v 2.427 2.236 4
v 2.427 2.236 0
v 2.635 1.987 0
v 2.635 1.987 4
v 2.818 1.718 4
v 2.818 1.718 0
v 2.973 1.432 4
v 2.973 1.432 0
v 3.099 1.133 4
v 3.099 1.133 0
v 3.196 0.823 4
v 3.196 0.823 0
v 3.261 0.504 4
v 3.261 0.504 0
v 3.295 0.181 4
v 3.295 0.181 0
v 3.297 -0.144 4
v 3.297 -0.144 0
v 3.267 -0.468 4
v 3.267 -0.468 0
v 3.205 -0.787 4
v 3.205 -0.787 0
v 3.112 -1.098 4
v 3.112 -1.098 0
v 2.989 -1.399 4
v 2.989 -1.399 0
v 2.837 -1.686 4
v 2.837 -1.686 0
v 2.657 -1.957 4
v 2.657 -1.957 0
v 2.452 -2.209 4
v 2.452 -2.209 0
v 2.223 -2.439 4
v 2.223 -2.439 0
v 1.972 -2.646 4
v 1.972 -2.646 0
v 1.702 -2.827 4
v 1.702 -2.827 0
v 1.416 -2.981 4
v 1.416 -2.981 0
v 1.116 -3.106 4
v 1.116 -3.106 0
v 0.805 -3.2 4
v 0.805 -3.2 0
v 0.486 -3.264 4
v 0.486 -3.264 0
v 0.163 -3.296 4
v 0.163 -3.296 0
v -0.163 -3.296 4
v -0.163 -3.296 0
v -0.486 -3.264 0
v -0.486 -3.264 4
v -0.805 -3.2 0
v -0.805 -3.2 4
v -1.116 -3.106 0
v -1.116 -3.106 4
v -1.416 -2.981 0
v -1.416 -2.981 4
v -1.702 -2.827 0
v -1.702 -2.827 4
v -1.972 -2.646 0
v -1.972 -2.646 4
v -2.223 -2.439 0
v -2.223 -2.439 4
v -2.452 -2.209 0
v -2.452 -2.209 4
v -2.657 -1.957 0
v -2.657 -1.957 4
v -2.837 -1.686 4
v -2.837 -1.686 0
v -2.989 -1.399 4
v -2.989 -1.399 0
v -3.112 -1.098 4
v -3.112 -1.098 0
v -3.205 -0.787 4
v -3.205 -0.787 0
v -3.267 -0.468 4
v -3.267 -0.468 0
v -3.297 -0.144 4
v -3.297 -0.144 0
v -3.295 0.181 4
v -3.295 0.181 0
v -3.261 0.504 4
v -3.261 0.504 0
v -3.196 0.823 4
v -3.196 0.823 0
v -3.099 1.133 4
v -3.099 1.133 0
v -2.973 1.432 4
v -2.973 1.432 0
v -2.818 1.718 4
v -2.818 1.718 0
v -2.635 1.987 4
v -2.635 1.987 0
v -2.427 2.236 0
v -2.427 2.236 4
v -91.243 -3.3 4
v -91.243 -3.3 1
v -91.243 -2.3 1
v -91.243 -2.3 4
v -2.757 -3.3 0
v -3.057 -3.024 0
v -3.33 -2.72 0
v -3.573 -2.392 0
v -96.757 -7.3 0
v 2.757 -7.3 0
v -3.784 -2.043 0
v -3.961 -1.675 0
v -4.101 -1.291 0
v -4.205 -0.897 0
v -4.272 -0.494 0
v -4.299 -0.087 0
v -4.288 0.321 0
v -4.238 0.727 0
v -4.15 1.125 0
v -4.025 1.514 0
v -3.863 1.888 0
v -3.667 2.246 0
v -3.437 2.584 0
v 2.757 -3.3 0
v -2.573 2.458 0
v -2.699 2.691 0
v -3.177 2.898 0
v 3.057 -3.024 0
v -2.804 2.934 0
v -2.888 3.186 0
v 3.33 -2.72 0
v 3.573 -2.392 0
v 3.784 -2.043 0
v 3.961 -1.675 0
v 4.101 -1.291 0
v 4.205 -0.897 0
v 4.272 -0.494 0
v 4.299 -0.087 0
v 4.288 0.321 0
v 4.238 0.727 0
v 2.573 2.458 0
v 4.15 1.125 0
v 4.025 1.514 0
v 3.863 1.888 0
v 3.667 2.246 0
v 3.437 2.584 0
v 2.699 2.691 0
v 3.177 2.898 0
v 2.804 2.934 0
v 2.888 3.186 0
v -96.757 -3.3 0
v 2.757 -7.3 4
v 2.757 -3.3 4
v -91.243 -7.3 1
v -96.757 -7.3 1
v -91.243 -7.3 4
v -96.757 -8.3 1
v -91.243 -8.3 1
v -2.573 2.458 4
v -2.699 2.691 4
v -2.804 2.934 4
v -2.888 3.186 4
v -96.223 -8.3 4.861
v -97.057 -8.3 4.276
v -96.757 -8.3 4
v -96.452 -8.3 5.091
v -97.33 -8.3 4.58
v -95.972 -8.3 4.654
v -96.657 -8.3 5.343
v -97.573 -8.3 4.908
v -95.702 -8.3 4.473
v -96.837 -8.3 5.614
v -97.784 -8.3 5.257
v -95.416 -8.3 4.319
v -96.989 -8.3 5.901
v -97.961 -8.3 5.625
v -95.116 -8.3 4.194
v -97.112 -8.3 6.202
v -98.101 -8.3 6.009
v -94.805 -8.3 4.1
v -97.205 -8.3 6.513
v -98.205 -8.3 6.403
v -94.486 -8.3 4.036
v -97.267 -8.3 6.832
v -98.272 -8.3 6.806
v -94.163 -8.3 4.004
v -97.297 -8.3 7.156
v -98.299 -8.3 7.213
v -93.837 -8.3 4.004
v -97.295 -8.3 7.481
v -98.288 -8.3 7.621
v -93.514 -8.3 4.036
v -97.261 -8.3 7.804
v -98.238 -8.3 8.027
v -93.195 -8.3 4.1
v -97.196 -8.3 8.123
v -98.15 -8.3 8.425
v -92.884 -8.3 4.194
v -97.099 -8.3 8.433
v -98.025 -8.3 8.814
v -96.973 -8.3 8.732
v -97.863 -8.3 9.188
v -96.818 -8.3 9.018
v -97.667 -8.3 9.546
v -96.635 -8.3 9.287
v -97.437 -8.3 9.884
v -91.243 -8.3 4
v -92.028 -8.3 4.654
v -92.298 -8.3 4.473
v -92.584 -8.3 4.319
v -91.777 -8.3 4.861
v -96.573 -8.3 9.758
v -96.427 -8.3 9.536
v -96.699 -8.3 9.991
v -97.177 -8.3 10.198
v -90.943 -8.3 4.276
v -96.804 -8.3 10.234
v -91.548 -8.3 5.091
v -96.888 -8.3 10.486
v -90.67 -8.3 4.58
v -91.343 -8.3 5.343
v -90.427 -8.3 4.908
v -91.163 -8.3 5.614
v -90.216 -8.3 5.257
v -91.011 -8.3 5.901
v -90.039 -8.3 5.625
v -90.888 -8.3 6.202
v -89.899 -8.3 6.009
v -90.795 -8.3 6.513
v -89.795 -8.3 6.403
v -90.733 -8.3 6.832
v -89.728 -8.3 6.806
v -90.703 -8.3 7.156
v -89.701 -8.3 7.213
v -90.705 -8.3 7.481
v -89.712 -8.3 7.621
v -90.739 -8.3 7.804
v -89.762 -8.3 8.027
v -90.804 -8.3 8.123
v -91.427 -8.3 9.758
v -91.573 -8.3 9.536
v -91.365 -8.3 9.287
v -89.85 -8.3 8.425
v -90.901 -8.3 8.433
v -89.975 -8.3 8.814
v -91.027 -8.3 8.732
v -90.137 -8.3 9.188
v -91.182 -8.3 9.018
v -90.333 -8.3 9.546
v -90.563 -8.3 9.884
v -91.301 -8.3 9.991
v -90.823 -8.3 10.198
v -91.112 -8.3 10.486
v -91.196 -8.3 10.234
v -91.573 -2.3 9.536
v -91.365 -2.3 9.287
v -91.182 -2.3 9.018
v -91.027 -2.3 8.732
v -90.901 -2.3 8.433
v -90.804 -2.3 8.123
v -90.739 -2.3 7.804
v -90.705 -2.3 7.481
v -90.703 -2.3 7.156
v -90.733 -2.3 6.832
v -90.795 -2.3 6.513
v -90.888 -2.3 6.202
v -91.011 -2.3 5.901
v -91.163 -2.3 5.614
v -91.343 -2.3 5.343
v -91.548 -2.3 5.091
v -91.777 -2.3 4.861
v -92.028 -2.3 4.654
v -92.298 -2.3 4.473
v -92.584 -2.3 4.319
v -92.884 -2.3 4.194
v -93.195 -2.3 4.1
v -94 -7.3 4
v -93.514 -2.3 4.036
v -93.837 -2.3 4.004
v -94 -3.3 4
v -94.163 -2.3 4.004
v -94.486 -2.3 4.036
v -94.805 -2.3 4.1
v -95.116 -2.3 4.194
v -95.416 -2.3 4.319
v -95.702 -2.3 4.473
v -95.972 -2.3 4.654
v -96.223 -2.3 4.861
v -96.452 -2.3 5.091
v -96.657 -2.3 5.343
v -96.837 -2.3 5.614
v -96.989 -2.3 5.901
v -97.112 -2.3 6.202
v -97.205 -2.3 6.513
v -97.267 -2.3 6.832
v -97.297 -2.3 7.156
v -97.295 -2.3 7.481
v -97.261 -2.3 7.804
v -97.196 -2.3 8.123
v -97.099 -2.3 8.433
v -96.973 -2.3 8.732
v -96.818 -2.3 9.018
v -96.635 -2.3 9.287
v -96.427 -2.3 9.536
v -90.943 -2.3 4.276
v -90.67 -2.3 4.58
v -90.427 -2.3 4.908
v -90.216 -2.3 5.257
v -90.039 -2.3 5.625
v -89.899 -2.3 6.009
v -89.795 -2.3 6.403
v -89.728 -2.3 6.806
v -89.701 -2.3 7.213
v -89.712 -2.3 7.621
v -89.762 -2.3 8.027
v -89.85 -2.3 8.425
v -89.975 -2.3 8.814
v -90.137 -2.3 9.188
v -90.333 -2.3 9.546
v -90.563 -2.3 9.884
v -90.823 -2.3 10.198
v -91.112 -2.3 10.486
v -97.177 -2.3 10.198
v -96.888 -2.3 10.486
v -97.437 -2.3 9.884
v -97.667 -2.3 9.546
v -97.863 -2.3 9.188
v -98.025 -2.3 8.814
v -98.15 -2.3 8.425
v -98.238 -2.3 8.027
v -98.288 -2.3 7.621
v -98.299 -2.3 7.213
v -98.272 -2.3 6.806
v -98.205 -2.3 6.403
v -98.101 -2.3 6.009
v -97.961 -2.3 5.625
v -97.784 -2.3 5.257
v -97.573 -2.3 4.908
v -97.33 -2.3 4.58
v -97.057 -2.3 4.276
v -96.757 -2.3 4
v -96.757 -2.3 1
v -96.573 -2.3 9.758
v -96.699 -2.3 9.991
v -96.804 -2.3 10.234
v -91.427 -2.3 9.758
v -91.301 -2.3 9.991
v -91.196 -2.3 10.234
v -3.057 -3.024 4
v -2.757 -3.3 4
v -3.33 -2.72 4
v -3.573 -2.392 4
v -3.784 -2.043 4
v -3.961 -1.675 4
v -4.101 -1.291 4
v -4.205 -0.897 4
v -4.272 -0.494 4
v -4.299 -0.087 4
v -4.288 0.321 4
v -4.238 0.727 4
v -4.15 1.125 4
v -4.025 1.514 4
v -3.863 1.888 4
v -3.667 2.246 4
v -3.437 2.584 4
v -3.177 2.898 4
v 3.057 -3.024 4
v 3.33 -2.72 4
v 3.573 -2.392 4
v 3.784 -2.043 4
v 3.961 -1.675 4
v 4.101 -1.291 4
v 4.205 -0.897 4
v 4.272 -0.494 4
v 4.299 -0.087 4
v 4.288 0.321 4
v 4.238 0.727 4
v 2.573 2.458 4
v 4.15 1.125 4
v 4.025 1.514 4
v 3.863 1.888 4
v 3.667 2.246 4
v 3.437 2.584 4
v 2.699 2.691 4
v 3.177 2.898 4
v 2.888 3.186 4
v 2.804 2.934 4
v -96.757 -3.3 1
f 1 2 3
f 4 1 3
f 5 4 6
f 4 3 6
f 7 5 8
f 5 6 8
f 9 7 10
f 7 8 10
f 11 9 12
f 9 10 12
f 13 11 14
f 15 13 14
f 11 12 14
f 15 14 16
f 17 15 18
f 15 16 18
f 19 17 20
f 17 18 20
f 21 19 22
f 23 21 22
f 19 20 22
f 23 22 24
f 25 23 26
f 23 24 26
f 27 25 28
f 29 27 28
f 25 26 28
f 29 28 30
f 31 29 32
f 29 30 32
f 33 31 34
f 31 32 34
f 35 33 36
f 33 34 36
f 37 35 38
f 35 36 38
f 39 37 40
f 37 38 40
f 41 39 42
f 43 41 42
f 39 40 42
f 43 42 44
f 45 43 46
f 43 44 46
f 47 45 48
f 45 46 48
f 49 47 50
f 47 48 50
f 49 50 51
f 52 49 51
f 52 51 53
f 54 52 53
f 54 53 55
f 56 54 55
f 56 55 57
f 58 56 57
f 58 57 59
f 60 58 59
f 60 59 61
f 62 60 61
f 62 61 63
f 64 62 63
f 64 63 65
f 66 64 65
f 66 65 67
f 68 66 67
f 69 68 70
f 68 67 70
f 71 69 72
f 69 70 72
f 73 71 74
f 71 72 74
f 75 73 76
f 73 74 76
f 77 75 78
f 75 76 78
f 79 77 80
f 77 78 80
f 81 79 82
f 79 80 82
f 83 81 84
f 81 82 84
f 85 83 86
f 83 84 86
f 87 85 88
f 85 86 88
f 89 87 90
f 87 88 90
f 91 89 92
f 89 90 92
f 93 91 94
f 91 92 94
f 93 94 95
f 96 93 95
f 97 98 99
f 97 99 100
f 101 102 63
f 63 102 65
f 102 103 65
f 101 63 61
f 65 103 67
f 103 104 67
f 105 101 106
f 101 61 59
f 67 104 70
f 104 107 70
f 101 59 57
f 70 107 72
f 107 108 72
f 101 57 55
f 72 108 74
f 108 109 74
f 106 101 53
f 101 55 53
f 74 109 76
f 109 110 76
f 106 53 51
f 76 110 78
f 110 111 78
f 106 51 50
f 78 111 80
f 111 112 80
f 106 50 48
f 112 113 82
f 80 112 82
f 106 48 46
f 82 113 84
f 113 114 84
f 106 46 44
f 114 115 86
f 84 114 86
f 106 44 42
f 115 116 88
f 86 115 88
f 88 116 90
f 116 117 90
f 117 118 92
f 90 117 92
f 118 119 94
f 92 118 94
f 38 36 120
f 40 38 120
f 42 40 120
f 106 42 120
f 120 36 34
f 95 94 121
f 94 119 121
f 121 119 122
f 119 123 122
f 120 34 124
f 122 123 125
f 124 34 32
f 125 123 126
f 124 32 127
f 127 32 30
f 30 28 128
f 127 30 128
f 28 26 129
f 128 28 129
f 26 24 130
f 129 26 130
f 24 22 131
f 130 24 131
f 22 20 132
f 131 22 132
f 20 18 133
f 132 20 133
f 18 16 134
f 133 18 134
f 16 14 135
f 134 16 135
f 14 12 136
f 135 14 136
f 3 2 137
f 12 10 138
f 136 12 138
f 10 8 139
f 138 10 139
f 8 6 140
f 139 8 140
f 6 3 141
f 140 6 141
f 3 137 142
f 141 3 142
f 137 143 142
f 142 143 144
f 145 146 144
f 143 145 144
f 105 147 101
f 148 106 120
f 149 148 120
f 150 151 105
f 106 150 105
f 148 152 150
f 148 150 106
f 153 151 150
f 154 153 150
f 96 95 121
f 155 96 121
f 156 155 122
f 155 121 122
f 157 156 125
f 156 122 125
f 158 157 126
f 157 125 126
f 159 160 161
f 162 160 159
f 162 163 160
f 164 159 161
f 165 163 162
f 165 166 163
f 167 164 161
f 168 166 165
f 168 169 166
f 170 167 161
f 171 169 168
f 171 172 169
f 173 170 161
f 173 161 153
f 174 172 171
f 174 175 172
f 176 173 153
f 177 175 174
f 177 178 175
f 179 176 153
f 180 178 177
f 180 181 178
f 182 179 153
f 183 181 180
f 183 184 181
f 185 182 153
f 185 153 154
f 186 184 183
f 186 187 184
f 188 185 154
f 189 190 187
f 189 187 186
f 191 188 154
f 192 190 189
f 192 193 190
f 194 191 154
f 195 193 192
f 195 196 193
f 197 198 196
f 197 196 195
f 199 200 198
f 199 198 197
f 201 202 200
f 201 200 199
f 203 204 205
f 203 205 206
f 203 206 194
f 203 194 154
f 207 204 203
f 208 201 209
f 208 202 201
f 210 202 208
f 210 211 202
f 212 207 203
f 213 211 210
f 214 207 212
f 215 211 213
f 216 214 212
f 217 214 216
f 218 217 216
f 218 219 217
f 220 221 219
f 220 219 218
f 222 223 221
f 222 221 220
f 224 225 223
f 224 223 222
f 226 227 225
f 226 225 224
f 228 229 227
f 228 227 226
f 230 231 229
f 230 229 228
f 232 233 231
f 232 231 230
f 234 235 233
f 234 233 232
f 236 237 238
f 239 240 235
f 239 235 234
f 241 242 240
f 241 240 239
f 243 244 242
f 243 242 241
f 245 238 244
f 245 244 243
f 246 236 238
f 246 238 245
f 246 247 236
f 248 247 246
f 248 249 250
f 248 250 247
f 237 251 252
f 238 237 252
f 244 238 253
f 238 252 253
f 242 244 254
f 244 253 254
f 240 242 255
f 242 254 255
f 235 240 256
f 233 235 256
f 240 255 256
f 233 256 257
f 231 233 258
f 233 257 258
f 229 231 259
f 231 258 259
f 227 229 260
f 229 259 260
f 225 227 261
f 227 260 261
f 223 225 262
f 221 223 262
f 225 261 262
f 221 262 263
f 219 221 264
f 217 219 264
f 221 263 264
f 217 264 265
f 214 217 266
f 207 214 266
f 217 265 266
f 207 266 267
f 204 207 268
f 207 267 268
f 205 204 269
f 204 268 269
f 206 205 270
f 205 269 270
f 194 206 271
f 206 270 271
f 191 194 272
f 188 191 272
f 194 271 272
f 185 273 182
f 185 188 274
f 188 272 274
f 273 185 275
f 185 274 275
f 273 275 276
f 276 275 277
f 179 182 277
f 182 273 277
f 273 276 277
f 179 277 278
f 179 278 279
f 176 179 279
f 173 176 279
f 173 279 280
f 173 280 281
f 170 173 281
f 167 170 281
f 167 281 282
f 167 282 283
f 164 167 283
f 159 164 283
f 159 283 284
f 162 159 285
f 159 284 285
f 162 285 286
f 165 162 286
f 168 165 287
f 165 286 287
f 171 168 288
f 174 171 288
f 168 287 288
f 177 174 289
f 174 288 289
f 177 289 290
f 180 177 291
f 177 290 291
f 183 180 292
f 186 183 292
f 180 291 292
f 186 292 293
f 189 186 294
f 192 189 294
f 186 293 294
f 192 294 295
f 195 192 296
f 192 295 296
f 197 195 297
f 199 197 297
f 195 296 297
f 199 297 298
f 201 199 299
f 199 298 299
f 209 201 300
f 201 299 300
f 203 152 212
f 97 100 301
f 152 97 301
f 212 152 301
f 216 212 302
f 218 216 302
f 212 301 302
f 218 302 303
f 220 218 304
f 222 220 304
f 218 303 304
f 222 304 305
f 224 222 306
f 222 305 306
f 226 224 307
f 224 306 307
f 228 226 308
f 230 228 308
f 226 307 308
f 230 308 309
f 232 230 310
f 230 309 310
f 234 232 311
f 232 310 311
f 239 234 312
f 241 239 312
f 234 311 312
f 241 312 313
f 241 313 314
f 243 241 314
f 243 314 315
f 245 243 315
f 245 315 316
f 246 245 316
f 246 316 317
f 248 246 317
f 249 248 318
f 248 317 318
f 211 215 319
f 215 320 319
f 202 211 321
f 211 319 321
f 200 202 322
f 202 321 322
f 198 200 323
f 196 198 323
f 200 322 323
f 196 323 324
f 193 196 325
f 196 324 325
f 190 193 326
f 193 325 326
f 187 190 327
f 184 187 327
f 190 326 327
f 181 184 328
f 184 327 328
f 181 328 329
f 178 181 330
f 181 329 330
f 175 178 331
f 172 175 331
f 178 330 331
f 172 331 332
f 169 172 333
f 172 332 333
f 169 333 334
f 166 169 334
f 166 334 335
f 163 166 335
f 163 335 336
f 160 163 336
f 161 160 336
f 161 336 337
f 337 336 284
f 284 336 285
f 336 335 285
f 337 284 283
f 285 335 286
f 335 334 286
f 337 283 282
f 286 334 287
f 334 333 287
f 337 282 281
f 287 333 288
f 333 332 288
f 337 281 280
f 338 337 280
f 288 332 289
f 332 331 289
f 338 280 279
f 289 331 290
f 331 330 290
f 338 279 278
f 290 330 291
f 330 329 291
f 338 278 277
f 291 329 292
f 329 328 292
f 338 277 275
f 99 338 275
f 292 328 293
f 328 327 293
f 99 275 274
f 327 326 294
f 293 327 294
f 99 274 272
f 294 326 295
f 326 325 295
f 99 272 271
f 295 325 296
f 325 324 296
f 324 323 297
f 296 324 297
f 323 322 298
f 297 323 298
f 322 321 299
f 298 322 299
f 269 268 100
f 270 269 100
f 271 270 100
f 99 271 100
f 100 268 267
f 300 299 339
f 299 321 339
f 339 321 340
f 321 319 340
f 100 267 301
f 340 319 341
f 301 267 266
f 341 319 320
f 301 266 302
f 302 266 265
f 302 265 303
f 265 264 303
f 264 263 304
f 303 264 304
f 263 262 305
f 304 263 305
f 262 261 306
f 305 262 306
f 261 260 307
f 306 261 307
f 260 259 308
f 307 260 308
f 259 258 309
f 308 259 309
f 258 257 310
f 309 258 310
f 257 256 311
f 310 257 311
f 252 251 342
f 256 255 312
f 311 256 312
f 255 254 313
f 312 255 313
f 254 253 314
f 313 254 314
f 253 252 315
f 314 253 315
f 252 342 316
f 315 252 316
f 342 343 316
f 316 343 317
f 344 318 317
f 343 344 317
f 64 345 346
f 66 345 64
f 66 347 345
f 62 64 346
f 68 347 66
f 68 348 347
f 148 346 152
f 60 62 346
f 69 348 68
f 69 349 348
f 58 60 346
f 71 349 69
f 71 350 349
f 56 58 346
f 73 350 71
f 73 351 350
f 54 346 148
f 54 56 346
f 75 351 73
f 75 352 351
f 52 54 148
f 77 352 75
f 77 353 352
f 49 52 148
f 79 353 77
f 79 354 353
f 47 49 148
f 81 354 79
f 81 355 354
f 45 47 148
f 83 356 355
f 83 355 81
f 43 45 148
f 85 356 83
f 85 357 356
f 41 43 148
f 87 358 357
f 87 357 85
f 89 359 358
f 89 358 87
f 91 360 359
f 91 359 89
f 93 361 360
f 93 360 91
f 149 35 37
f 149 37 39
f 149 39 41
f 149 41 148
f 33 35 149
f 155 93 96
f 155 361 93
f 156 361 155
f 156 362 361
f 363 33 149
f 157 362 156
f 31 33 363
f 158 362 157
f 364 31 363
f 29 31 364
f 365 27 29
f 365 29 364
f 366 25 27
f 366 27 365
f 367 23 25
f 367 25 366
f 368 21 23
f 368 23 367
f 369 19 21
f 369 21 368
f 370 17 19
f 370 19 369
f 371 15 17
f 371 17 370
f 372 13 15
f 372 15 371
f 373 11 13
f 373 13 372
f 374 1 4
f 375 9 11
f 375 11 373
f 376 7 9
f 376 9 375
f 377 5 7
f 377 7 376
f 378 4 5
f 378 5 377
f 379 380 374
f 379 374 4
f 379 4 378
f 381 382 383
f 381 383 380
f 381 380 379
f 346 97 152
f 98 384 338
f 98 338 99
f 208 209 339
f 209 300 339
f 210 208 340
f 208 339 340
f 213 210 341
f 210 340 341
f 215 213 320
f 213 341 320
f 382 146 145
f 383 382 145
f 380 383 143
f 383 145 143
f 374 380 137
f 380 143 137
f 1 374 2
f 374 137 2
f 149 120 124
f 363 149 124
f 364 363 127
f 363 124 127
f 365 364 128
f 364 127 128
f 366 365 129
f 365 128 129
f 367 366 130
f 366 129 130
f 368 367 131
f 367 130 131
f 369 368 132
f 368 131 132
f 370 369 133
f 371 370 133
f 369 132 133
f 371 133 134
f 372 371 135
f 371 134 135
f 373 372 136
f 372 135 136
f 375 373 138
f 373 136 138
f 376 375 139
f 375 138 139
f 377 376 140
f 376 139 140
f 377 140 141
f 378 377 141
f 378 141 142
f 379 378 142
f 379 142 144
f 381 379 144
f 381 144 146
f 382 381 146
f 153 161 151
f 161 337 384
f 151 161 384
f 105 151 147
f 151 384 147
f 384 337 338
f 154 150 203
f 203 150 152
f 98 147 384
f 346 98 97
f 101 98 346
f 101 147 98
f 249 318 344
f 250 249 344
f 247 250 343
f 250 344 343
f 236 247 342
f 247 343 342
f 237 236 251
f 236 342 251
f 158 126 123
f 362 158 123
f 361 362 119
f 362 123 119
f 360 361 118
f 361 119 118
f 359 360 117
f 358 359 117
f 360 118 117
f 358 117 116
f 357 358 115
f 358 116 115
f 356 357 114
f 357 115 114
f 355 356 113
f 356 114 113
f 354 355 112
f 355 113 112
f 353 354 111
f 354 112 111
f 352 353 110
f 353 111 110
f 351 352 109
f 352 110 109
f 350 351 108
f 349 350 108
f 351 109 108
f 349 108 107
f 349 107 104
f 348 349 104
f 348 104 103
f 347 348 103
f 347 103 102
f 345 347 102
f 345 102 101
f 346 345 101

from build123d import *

# Parameters (mm, degrees)
F0_W     = 94
F0_H     = 4
F1_DEPTH = 4
F3_DEPTH = 5
F4_DEPTH = 1


with BuildPart() as f1:
    # F0 (on Top) → F1 (new body)
    with BuildSketch(Plane.XY):
        with BuildLine():
            ThreePointArc((2.426764, 2.23625), (0, -3.3), (-2.426764, 2.23625))
            ThreePointArc((-2.426764, 2.23625), (-2.699268, 2.69082), (-2.887527, 3.18625))
            ThreePointArc((-2.887527, 3.18625), (-4.299127, -0.08664), (-2.75681, -3.3))
            Line((-2.75681, -3.3), (-2.75681, -7.3))
            Line((-2.75681, -7.3), (2.75681, -7.3))
            Line((2.75681, -7.3), (2.75681, -3.3))
            ThreePointArc((2.75681, -3.3), (4.299127, -0.08664), (2.887527, 3.18625))
            ThreePointArc((2.887527, 3.18625), (2.699268, 2.69082), (2.426764, 2.23625))
        make_face()
        with Locations((-49.75681, -5.3)):
            Rectangle(F0_W, F0_H)
    extrude(amount=F1_DEPTH)

    # F2 (on face) → F3 (join)
    with BuildSketch(Plane.XZ.offset(7.3)):
        with BuildLine():
            ThreePointArc((-91.573236, 9.53625), (-94, 4), (-96.426764, 9.53625))
            ThreePointArc((-96.426764, 9.53625), (-96.699268, 9.99082), (-96.887527, 10.48625))
            ThreePointArc((-96.887527, 10.48625), (-98.299127, 7.21336), (-96.75681, 4))
            Line((-96.75681, 4), (-96.75681, 1))
            Line((-96.75681, 1), (-91.24319, 1))
            Line((-91.24319, 1), (-91.24319, 4))
            ThreePointArc((-91.24319, 4), (-89.700873, 7.21336), (-91.112473, 10.48625))
            ThreePointArc((-91.112473, 10.48625), (-91.300732, 9.99082), (-91.573236, 9.53625))
        make_face()
    extrude(amount=-F3_DEPTH)

    # F2 (on face) → F4 (join)
    with BuildSketch(Plane.XZ.offset(7.3)):
        with BuildLine():
            ThreePointArc((-91.573236, 9.53625), (-94, 4), (-96.426764, 9.53625))
            ThreePointArc((-96.426764, 9.53625), (-96.699268, 9.99082), (-96.887527, 10.48625))
            ThreePointArc((-96.887527, 10.48625), (-98.299127, 7.21336), (-96.75681, 4))
            Line((-96.75681, 4), (-96.75681, 1))
            Line((-96.75681, 1), (-91.24319, 1))
            Line((-91.24319, 1), (-91.24319, 4))
            ThreePointArc((-91.24319, 4), (-89.700873, 7.21336), (-91.112473, 10.48625))
            ThreePointArc((-91.112473, 10.48625), (-91.300732, 9.99082), (-91.573236, 9.53625))
        make_face()
    extrude(amount=F4_DEPTH)


solid = f1.part
